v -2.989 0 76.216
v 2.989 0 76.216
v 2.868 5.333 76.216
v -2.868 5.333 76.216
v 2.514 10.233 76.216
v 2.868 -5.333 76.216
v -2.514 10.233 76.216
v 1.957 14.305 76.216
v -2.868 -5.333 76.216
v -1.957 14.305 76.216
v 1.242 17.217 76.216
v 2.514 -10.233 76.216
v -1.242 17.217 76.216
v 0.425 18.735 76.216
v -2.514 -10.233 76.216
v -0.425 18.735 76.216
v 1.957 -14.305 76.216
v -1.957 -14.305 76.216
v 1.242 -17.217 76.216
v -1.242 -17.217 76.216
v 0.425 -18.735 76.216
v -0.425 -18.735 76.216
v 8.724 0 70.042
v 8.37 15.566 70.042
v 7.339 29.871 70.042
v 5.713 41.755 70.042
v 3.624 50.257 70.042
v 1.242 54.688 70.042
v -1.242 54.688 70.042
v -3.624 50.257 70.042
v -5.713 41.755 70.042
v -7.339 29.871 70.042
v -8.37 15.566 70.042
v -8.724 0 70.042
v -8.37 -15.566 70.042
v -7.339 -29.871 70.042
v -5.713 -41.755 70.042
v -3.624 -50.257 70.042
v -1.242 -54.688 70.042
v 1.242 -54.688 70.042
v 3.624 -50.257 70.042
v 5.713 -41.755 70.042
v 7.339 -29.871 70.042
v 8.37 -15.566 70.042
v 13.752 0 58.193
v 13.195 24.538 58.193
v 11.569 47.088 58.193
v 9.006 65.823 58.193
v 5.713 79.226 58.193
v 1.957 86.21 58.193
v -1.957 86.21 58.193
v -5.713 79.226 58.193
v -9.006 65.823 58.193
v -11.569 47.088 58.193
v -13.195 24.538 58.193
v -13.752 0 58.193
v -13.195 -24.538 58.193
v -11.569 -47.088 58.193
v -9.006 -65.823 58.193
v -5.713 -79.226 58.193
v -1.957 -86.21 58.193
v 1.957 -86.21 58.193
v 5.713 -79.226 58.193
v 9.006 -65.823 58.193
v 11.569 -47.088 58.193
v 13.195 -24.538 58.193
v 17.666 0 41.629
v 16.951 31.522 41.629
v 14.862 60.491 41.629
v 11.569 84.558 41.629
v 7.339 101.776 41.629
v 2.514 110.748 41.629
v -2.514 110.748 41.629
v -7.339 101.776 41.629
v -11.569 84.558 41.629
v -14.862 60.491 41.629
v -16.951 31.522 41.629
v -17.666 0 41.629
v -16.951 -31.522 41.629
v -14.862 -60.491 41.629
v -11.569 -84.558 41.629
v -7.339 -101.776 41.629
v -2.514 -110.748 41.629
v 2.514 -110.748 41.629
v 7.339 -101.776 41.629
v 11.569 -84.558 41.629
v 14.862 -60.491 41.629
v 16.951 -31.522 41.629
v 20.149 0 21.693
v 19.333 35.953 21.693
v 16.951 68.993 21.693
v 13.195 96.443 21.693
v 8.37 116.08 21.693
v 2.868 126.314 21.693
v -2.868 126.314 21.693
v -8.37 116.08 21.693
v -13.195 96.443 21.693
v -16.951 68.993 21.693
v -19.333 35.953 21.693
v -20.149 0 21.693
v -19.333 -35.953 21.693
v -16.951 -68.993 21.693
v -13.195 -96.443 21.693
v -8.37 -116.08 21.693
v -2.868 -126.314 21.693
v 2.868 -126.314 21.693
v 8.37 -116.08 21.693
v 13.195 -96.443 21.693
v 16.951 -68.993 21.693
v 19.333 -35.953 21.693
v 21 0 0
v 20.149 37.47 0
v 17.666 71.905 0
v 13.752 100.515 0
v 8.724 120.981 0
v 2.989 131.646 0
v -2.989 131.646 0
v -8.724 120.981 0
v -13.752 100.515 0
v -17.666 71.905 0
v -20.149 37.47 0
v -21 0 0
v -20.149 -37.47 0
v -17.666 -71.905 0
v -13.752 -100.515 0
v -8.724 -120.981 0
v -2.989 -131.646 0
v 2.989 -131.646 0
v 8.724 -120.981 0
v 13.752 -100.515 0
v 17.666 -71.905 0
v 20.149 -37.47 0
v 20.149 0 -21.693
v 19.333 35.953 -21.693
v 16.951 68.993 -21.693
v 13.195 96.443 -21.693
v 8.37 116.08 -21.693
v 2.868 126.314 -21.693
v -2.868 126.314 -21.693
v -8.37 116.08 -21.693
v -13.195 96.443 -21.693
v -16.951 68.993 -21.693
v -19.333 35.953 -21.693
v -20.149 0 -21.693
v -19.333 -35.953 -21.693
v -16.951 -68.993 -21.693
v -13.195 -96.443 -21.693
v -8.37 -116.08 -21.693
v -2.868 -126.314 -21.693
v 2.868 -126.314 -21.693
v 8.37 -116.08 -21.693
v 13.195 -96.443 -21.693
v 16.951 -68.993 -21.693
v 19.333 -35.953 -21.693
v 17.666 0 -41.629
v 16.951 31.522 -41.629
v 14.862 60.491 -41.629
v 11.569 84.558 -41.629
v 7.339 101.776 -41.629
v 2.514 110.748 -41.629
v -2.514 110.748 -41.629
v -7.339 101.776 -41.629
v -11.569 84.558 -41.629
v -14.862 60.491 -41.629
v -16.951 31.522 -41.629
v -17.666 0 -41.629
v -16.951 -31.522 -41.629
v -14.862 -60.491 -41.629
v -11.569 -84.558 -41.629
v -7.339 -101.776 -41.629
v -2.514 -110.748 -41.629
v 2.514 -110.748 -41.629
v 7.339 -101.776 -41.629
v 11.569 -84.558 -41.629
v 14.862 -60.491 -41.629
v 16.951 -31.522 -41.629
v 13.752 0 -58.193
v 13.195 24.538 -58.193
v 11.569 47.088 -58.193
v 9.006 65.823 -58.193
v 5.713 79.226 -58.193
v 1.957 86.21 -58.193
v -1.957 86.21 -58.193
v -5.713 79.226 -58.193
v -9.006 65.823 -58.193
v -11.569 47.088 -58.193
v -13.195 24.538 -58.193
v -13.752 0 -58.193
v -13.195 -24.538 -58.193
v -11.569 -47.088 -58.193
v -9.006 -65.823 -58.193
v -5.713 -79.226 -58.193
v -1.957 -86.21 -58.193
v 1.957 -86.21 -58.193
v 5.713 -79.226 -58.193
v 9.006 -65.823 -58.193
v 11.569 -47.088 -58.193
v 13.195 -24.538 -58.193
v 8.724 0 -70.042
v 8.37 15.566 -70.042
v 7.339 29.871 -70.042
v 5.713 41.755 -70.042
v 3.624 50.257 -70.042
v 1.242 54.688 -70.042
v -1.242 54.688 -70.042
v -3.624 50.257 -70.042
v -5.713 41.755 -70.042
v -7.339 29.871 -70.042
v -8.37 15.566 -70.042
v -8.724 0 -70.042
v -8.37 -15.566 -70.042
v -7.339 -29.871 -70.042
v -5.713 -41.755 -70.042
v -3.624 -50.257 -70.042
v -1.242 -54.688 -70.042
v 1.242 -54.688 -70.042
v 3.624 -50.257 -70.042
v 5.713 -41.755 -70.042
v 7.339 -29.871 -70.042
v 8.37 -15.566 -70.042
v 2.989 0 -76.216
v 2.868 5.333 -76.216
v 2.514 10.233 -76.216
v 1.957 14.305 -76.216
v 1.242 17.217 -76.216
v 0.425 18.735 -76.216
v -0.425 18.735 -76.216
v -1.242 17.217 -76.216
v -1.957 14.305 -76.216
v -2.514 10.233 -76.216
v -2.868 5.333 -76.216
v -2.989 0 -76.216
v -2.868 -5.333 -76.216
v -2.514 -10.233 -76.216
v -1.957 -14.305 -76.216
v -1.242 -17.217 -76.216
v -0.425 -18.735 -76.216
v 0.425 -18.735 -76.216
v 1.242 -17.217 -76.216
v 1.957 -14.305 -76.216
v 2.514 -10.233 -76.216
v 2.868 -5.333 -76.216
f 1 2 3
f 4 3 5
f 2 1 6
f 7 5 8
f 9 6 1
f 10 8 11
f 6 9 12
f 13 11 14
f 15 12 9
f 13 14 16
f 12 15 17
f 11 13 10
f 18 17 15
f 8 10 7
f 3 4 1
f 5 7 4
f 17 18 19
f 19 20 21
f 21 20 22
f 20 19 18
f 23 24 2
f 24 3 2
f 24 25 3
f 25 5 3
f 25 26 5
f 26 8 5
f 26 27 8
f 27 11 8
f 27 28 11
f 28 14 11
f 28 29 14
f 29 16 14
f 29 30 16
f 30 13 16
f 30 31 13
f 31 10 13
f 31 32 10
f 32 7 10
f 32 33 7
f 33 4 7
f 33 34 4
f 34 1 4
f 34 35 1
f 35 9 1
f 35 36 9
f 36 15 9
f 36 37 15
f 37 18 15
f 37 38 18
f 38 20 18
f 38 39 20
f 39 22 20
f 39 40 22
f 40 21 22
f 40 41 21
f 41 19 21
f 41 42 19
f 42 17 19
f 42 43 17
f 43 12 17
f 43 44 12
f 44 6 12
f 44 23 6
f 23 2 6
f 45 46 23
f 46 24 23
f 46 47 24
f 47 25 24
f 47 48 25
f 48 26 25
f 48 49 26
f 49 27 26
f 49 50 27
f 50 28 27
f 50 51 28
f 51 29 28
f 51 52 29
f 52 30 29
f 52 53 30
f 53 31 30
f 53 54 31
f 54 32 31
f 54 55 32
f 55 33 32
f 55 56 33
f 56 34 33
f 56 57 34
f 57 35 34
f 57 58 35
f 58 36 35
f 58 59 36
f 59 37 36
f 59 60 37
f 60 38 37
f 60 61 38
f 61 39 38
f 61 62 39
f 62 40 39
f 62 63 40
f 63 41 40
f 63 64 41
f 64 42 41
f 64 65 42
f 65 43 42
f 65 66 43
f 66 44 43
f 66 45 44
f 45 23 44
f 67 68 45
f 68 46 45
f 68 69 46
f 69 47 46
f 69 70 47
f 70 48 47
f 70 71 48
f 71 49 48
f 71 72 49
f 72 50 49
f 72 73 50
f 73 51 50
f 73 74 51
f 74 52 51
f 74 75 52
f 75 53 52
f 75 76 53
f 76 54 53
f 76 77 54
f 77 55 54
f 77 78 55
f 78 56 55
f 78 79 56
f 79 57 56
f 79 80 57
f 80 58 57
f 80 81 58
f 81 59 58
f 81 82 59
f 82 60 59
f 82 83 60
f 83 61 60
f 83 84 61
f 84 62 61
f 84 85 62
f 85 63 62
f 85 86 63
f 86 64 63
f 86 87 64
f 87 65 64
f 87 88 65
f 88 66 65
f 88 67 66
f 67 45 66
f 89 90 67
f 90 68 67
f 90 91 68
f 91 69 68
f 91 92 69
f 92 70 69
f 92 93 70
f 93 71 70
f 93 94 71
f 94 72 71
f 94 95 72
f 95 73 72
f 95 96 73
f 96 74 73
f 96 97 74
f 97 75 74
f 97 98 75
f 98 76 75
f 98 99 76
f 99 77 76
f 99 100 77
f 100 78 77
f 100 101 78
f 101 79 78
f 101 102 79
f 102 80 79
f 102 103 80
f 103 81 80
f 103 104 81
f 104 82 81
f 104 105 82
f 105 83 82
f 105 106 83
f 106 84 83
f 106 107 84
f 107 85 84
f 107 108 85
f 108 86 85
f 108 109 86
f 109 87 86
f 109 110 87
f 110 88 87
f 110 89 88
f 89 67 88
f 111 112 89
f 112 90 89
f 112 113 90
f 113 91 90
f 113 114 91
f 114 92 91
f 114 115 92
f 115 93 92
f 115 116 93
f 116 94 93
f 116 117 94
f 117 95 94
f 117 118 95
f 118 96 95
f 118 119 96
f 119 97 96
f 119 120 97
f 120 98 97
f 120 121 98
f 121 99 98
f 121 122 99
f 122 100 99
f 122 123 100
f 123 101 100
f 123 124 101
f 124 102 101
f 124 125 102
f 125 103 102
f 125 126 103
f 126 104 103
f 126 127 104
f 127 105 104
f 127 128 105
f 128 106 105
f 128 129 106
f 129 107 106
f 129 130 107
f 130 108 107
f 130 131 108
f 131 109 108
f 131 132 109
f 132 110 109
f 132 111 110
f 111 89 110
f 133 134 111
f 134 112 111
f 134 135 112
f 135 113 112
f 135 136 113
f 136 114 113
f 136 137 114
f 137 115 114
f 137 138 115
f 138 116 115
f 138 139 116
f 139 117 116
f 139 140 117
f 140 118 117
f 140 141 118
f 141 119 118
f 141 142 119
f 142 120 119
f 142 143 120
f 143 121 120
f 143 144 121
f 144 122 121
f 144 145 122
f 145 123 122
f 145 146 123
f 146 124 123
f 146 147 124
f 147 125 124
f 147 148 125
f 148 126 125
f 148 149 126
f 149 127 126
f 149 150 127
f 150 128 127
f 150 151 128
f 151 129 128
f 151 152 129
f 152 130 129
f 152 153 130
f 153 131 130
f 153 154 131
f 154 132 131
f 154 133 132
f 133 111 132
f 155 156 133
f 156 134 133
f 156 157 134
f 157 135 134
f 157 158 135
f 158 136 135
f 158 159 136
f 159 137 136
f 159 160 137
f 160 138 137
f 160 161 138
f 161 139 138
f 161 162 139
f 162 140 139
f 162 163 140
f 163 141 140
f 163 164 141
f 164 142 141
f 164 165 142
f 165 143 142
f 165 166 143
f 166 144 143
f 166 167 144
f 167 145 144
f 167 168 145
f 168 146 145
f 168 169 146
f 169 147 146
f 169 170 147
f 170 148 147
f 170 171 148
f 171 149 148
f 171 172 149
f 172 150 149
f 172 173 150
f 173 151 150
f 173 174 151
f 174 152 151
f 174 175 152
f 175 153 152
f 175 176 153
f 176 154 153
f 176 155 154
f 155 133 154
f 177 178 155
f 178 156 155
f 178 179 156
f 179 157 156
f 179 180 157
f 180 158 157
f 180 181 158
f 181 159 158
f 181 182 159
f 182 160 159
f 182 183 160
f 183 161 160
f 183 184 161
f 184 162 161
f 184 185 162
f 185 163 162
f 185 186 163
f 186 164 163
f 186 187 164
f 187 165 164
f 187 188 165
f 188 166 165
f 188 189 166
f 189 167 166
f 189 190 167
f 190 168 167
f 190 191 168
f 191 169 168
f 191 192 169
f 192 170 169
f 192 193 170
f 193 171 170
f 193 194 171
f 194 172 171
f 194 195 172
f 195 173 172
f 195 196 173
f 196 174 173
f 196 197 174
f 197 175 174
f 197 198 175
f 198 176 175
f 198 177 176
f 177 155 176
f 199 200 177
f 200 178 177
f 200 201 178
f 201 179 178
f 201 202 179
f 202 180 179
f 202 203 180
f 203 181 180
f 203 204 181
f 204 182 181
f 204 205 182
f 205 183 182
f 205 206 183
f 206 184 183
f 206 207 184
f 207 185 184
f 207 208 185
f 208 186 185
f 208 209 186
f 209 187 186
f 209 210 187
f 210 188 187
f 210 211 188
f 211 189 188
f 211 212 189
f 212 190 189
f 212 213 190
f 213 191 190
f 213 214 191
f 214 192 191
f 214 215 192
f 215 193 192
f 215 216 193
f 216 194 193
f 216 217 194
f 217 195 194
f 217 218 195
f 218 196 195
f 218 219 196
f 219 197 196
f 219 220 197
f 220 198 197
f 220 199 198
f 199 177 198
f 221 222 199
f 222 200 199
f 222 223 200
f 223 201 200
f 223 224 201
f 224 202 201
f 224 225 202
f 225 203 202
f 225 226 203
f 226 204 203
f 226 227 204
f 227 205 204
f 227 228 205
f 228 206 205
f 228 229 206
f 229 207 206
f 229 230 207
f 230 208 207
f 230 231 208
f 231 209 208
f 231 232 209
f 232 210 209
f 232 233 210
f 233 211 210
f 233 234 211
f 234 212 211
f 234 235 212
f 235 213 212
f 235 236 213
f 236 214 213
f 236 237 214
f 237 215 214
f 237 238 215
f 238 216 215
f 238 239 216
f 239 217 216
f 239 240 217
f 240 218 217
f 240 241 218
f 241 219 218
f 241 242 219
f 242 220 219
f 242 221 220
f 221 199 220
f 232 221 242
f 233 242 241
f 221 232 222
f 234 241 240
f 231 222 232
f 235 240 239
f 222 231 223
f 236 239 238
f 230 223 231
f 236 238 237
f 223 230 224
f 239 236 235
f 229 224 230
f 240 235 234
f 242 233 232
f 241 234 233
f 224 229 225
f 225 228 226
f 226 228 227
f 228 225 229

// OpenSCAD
// Generated by SolidPython 1.0.1 on 2020-07-29 00:46:46


scale(v = [3, 19, 11]) {
	sphere(r = 7);
}
/***********************************************
*********      SolidPython code:      **********
************************************************
 
# import packages: SolidPython
from solid import *
from solid.utils import *
from itertools import chain, combinations, permutations


class Resize:

    def __init__(self, scad_file):
        self.scad_file = scad_file
        #self.scad_file = import_scad(scad_file)
        # cone/cylinder param:
        self.r1 = 0
        self.r2 = 0
        self.h = 0
        # rectangular prism param:
        self.w = 0
        self.l = 0
        # ellipse param:
        self.r = 0

    # import OpenScad code (file name corresponds to shape)


    # classify shape + parameters
    def assign(self, param1, param2, param3):
        if self.scad_file == 'cone.scad':
            self.r1 = param1
            self.r2 = param2
            self.h = param3
        elif self.scad_file == 'cylinder.scad':
            self.r1 = param1
            self.r2 = param2
            self.h = param3
        elif self.scad_file == 'rectangularPrism.scad':
            self.h = param1
            self.l = param2
            self.w = param3
        else:
            self.r = param1
            self.h = param2

    # resize parameters
    def iterate(self):
        x = range(3, 20, 2)
        i = 1
        if self.scad_file == 'cone.scad':
            tempList = list(permutations(x, 2))
            for temp in tempList:
                param1 = temp[0]
                param2 = temp[1]
                filepath = 'produced_scad_files/' + 'cone' + str(param1) + '_' + str(param2) + '_' + '.scad'
                scad_render_to_file(cylinder(h=param1, r1=param2, r2=0), filepath)

        elif self.scad_file == 'cylinder.scad':
            tempList = list(permutations(x, 3))
            for temp in tempList:
                param1 = temp[0]
                param2 = temp[1]
                filepath = 'produced_scad_files/' + 'cylinder' + str(param1) + '_' + str(param2) + '_' + '.scad'
                scad_render_to_file(cylinder(h=param1, r1=param2, r2=param2), filepath)

        elif self.scad_file == 'rectangularPrism.scad':
            tempList = list(permutations(x, 3))
            for temp in tempList:
                param1 = temp[0]
                param2 = temp[1]
                param3 = temp[2]
                filepath = 'produced_scad_files/' + 'rectangularPrism' + str(param1) + '_' + str(param2) + '_' + str(
                    param3) + '.scad'
                scad_render_to_file(cube(size=(param1, param2, param3)), filepath)

        elif self.scad_file == 'ellipse.scad':
            tempList = list(permutations(x, 4))
            for temp in tempList:
                param1 = temp[0]
                param2 = temp[1]
                param3 = temp[2]
                param4 = temp[3]
                filepath = 'produced_scad_files/' + 'ellipse' + str(param1) + '_' + str(param2) + '_' + str(param3) + '_' + str(param4) + '.scad'
                scad_render_to_file(scale([param1, param2, param3])(sphere(r=param4)), filepath)

    def render_to_scadfile(self):
        scad_render_to_file(scad, 'example.scad') 
 
************************************************/
